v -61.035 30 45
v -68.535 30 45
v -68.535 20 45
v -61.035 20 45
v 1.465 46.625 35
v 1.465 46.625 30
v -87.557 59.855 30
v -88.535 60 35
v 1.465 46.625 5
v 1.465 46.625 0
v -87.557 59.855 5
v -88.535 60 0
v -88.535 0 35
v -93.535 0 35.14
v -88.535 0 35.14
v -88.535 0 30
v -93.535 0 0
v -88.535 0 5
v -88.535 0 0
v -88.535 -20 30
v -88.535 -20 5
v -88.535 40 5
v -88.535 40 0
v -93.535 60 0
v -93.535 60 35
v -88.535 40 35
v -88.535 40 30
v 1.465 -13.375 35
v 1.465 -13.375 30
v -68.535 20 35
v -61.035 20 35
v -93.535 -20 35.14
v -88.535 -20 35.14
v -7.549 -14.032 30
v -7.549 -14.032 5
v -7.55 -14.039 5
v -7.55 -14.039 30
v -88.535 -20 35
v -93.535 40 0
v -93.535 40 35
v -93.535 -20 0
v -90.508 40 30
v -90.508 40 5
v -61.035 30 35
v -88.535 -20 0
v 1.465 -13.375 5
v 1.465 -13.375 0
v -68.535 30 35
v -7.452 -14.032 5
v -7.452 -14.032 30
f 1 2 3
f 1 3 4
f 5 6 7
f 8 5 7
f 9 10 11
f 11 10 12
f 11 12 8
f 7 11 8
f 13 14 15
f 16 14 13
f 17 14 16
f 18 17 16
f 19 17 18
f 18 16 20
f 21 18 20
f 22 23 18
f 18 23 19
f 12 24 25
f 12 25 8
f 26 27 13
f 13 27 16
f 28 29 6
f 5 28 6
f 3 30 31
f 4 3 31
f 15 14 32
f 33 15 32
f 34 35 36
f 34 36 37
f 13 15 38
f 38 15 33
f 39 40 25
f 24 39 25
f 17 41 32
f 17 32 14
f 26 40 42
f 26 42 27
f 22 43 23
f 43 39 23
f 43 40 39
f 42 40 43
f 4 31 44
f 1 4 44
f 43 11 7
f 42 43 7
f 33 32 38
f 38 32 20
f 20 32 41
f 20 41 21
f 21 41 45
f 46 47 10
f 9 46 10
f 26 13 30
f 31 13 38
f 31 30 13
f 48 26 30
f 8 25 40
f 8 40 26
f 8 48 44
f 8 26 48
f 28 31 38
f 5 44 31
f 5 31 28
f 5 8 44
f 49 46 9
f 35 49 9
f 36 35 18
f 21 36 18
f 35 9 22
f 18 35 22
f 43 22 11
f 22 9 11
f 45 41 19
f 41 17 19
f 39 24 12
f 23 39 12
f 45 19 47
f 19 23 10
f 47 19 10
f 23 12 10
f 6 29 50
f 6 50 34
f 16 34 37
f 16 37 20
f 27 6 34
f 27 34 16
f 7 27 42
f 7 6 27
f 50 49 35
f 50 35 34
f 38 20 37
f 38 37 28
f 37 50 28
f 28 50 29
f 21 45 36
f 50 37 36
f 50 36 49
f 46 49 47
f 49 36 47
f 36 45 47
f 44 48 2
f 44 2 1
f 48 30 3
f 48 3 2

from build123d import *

# Parameters (mm, degrees)
F0_W      = 5
F0_H      = 20
F1_DEPTH  = 35
F2_W      = 90
F2_H      = 25
F3_DEPTH  = 79.8669262783
F4_W      = 20
F4_H      = 35.1404882967
F5_DEPTH  = 5
F6_W      = 60
F6_H      = 25
F7_DEPTH  = 8.9178062806
F8_W      = 8.9168062806
F8_H      = 25
F9_DEPTH  = 12.5
F10_W     = 0.6563552694
F10_H     = 25
F11_DEPTH = 5
F12_W     = 7.5
F12_H     = 10
F13_DEPTH = 10


with BuildPart() as f1:
    # F0 (on Top) → F1 (new body)
    with BuildSketch(Plane.XY):
        Polygon((1.4652782414, 46.6247905791), (-88.5347217586, 60), (-88.5347217586, 40), (-88.5347217586, 0), (-88.5347217586, -20), (1.4652782414, -13.3752094209), align=None)
        with Locations((-91.0347217586, 50)):
            Rectangle(F0_W, F0_H)
        with Locations((-91.0347217586, -10)):
            Rectangle(F0_W, F0_H)
    extrude(amount=F1_DEPTH)

    # F2 (on face) → F3 (cut, through all)
    with BuildSketch(Plane(origin=(6.8110049505, 45.8303437542, 0), x_dir=(-0.9891366412, 0.1469989969, 0), z_dir=(0.1469989969, 0.9891366412, 0))):
        with Locations((50.404437048, 17.5)):
            Rectangle(F2_W, F2_H)
    extrude(amount=-F3_DEPTH, mode=Mode.SUBTRACT)

    # F4 (on face) → F5 (join)
    with BuildSketch(Plane(origin=(-93.5347217586, 0, 0), x_dir=(0, -1, 0), z_dir=(-1, 0, 0))):
        with Locations((10, 17.5702441484)):
            Rectangle(F4_W, F4_H)
    extrude(amount=-F5_DEPTH)

    # F6 (on face) → F7 (cut, through all)
    with BuildSketch(Plane.YZ.offset(1.4652782414)):
        with Locations((16.6247905791, 17.5)):
            Rectangle(F6_W, F6_H)
    extrude(amount=-F7_DEPTH, mode=Mode.SUBTRACT)

    # F8 (on face) → F9 (cut, symmetric)
    with BuildSketch(Plane(origin=(0, -13.3752094209, 0), x_dir=(-1, 0, 0), z_dir=(0, 1, 0))):
        with Locations((2.9931248989, 17.5)):
            Rectangle(F8_W, F8_H)
    extrude(amount=F9_DEPTH, both=True, mode=Mode.SUBTRACT)

    # F10 (on face) → F11 (cut, symmetric)
    with BuildSketch(Plane.YZ.offset(-7.4515280392)):
        with Locations((-13.7033870556, 17.5)):
            Rectangle(F10_W, F10_H)
    extrude(amount=F11_DEPTH, both=True, mode=Mode.SUBTRACT)

    # F12 (on face) → F13 (join)
    with BuildSketch(Plane.XY.offset(35)):
        with Locations((-64.7847217586, 25)):
            Rectangle(F12_W, F12_H)
    extrude(amount=F13_DEPTH)


solid = f1.part
